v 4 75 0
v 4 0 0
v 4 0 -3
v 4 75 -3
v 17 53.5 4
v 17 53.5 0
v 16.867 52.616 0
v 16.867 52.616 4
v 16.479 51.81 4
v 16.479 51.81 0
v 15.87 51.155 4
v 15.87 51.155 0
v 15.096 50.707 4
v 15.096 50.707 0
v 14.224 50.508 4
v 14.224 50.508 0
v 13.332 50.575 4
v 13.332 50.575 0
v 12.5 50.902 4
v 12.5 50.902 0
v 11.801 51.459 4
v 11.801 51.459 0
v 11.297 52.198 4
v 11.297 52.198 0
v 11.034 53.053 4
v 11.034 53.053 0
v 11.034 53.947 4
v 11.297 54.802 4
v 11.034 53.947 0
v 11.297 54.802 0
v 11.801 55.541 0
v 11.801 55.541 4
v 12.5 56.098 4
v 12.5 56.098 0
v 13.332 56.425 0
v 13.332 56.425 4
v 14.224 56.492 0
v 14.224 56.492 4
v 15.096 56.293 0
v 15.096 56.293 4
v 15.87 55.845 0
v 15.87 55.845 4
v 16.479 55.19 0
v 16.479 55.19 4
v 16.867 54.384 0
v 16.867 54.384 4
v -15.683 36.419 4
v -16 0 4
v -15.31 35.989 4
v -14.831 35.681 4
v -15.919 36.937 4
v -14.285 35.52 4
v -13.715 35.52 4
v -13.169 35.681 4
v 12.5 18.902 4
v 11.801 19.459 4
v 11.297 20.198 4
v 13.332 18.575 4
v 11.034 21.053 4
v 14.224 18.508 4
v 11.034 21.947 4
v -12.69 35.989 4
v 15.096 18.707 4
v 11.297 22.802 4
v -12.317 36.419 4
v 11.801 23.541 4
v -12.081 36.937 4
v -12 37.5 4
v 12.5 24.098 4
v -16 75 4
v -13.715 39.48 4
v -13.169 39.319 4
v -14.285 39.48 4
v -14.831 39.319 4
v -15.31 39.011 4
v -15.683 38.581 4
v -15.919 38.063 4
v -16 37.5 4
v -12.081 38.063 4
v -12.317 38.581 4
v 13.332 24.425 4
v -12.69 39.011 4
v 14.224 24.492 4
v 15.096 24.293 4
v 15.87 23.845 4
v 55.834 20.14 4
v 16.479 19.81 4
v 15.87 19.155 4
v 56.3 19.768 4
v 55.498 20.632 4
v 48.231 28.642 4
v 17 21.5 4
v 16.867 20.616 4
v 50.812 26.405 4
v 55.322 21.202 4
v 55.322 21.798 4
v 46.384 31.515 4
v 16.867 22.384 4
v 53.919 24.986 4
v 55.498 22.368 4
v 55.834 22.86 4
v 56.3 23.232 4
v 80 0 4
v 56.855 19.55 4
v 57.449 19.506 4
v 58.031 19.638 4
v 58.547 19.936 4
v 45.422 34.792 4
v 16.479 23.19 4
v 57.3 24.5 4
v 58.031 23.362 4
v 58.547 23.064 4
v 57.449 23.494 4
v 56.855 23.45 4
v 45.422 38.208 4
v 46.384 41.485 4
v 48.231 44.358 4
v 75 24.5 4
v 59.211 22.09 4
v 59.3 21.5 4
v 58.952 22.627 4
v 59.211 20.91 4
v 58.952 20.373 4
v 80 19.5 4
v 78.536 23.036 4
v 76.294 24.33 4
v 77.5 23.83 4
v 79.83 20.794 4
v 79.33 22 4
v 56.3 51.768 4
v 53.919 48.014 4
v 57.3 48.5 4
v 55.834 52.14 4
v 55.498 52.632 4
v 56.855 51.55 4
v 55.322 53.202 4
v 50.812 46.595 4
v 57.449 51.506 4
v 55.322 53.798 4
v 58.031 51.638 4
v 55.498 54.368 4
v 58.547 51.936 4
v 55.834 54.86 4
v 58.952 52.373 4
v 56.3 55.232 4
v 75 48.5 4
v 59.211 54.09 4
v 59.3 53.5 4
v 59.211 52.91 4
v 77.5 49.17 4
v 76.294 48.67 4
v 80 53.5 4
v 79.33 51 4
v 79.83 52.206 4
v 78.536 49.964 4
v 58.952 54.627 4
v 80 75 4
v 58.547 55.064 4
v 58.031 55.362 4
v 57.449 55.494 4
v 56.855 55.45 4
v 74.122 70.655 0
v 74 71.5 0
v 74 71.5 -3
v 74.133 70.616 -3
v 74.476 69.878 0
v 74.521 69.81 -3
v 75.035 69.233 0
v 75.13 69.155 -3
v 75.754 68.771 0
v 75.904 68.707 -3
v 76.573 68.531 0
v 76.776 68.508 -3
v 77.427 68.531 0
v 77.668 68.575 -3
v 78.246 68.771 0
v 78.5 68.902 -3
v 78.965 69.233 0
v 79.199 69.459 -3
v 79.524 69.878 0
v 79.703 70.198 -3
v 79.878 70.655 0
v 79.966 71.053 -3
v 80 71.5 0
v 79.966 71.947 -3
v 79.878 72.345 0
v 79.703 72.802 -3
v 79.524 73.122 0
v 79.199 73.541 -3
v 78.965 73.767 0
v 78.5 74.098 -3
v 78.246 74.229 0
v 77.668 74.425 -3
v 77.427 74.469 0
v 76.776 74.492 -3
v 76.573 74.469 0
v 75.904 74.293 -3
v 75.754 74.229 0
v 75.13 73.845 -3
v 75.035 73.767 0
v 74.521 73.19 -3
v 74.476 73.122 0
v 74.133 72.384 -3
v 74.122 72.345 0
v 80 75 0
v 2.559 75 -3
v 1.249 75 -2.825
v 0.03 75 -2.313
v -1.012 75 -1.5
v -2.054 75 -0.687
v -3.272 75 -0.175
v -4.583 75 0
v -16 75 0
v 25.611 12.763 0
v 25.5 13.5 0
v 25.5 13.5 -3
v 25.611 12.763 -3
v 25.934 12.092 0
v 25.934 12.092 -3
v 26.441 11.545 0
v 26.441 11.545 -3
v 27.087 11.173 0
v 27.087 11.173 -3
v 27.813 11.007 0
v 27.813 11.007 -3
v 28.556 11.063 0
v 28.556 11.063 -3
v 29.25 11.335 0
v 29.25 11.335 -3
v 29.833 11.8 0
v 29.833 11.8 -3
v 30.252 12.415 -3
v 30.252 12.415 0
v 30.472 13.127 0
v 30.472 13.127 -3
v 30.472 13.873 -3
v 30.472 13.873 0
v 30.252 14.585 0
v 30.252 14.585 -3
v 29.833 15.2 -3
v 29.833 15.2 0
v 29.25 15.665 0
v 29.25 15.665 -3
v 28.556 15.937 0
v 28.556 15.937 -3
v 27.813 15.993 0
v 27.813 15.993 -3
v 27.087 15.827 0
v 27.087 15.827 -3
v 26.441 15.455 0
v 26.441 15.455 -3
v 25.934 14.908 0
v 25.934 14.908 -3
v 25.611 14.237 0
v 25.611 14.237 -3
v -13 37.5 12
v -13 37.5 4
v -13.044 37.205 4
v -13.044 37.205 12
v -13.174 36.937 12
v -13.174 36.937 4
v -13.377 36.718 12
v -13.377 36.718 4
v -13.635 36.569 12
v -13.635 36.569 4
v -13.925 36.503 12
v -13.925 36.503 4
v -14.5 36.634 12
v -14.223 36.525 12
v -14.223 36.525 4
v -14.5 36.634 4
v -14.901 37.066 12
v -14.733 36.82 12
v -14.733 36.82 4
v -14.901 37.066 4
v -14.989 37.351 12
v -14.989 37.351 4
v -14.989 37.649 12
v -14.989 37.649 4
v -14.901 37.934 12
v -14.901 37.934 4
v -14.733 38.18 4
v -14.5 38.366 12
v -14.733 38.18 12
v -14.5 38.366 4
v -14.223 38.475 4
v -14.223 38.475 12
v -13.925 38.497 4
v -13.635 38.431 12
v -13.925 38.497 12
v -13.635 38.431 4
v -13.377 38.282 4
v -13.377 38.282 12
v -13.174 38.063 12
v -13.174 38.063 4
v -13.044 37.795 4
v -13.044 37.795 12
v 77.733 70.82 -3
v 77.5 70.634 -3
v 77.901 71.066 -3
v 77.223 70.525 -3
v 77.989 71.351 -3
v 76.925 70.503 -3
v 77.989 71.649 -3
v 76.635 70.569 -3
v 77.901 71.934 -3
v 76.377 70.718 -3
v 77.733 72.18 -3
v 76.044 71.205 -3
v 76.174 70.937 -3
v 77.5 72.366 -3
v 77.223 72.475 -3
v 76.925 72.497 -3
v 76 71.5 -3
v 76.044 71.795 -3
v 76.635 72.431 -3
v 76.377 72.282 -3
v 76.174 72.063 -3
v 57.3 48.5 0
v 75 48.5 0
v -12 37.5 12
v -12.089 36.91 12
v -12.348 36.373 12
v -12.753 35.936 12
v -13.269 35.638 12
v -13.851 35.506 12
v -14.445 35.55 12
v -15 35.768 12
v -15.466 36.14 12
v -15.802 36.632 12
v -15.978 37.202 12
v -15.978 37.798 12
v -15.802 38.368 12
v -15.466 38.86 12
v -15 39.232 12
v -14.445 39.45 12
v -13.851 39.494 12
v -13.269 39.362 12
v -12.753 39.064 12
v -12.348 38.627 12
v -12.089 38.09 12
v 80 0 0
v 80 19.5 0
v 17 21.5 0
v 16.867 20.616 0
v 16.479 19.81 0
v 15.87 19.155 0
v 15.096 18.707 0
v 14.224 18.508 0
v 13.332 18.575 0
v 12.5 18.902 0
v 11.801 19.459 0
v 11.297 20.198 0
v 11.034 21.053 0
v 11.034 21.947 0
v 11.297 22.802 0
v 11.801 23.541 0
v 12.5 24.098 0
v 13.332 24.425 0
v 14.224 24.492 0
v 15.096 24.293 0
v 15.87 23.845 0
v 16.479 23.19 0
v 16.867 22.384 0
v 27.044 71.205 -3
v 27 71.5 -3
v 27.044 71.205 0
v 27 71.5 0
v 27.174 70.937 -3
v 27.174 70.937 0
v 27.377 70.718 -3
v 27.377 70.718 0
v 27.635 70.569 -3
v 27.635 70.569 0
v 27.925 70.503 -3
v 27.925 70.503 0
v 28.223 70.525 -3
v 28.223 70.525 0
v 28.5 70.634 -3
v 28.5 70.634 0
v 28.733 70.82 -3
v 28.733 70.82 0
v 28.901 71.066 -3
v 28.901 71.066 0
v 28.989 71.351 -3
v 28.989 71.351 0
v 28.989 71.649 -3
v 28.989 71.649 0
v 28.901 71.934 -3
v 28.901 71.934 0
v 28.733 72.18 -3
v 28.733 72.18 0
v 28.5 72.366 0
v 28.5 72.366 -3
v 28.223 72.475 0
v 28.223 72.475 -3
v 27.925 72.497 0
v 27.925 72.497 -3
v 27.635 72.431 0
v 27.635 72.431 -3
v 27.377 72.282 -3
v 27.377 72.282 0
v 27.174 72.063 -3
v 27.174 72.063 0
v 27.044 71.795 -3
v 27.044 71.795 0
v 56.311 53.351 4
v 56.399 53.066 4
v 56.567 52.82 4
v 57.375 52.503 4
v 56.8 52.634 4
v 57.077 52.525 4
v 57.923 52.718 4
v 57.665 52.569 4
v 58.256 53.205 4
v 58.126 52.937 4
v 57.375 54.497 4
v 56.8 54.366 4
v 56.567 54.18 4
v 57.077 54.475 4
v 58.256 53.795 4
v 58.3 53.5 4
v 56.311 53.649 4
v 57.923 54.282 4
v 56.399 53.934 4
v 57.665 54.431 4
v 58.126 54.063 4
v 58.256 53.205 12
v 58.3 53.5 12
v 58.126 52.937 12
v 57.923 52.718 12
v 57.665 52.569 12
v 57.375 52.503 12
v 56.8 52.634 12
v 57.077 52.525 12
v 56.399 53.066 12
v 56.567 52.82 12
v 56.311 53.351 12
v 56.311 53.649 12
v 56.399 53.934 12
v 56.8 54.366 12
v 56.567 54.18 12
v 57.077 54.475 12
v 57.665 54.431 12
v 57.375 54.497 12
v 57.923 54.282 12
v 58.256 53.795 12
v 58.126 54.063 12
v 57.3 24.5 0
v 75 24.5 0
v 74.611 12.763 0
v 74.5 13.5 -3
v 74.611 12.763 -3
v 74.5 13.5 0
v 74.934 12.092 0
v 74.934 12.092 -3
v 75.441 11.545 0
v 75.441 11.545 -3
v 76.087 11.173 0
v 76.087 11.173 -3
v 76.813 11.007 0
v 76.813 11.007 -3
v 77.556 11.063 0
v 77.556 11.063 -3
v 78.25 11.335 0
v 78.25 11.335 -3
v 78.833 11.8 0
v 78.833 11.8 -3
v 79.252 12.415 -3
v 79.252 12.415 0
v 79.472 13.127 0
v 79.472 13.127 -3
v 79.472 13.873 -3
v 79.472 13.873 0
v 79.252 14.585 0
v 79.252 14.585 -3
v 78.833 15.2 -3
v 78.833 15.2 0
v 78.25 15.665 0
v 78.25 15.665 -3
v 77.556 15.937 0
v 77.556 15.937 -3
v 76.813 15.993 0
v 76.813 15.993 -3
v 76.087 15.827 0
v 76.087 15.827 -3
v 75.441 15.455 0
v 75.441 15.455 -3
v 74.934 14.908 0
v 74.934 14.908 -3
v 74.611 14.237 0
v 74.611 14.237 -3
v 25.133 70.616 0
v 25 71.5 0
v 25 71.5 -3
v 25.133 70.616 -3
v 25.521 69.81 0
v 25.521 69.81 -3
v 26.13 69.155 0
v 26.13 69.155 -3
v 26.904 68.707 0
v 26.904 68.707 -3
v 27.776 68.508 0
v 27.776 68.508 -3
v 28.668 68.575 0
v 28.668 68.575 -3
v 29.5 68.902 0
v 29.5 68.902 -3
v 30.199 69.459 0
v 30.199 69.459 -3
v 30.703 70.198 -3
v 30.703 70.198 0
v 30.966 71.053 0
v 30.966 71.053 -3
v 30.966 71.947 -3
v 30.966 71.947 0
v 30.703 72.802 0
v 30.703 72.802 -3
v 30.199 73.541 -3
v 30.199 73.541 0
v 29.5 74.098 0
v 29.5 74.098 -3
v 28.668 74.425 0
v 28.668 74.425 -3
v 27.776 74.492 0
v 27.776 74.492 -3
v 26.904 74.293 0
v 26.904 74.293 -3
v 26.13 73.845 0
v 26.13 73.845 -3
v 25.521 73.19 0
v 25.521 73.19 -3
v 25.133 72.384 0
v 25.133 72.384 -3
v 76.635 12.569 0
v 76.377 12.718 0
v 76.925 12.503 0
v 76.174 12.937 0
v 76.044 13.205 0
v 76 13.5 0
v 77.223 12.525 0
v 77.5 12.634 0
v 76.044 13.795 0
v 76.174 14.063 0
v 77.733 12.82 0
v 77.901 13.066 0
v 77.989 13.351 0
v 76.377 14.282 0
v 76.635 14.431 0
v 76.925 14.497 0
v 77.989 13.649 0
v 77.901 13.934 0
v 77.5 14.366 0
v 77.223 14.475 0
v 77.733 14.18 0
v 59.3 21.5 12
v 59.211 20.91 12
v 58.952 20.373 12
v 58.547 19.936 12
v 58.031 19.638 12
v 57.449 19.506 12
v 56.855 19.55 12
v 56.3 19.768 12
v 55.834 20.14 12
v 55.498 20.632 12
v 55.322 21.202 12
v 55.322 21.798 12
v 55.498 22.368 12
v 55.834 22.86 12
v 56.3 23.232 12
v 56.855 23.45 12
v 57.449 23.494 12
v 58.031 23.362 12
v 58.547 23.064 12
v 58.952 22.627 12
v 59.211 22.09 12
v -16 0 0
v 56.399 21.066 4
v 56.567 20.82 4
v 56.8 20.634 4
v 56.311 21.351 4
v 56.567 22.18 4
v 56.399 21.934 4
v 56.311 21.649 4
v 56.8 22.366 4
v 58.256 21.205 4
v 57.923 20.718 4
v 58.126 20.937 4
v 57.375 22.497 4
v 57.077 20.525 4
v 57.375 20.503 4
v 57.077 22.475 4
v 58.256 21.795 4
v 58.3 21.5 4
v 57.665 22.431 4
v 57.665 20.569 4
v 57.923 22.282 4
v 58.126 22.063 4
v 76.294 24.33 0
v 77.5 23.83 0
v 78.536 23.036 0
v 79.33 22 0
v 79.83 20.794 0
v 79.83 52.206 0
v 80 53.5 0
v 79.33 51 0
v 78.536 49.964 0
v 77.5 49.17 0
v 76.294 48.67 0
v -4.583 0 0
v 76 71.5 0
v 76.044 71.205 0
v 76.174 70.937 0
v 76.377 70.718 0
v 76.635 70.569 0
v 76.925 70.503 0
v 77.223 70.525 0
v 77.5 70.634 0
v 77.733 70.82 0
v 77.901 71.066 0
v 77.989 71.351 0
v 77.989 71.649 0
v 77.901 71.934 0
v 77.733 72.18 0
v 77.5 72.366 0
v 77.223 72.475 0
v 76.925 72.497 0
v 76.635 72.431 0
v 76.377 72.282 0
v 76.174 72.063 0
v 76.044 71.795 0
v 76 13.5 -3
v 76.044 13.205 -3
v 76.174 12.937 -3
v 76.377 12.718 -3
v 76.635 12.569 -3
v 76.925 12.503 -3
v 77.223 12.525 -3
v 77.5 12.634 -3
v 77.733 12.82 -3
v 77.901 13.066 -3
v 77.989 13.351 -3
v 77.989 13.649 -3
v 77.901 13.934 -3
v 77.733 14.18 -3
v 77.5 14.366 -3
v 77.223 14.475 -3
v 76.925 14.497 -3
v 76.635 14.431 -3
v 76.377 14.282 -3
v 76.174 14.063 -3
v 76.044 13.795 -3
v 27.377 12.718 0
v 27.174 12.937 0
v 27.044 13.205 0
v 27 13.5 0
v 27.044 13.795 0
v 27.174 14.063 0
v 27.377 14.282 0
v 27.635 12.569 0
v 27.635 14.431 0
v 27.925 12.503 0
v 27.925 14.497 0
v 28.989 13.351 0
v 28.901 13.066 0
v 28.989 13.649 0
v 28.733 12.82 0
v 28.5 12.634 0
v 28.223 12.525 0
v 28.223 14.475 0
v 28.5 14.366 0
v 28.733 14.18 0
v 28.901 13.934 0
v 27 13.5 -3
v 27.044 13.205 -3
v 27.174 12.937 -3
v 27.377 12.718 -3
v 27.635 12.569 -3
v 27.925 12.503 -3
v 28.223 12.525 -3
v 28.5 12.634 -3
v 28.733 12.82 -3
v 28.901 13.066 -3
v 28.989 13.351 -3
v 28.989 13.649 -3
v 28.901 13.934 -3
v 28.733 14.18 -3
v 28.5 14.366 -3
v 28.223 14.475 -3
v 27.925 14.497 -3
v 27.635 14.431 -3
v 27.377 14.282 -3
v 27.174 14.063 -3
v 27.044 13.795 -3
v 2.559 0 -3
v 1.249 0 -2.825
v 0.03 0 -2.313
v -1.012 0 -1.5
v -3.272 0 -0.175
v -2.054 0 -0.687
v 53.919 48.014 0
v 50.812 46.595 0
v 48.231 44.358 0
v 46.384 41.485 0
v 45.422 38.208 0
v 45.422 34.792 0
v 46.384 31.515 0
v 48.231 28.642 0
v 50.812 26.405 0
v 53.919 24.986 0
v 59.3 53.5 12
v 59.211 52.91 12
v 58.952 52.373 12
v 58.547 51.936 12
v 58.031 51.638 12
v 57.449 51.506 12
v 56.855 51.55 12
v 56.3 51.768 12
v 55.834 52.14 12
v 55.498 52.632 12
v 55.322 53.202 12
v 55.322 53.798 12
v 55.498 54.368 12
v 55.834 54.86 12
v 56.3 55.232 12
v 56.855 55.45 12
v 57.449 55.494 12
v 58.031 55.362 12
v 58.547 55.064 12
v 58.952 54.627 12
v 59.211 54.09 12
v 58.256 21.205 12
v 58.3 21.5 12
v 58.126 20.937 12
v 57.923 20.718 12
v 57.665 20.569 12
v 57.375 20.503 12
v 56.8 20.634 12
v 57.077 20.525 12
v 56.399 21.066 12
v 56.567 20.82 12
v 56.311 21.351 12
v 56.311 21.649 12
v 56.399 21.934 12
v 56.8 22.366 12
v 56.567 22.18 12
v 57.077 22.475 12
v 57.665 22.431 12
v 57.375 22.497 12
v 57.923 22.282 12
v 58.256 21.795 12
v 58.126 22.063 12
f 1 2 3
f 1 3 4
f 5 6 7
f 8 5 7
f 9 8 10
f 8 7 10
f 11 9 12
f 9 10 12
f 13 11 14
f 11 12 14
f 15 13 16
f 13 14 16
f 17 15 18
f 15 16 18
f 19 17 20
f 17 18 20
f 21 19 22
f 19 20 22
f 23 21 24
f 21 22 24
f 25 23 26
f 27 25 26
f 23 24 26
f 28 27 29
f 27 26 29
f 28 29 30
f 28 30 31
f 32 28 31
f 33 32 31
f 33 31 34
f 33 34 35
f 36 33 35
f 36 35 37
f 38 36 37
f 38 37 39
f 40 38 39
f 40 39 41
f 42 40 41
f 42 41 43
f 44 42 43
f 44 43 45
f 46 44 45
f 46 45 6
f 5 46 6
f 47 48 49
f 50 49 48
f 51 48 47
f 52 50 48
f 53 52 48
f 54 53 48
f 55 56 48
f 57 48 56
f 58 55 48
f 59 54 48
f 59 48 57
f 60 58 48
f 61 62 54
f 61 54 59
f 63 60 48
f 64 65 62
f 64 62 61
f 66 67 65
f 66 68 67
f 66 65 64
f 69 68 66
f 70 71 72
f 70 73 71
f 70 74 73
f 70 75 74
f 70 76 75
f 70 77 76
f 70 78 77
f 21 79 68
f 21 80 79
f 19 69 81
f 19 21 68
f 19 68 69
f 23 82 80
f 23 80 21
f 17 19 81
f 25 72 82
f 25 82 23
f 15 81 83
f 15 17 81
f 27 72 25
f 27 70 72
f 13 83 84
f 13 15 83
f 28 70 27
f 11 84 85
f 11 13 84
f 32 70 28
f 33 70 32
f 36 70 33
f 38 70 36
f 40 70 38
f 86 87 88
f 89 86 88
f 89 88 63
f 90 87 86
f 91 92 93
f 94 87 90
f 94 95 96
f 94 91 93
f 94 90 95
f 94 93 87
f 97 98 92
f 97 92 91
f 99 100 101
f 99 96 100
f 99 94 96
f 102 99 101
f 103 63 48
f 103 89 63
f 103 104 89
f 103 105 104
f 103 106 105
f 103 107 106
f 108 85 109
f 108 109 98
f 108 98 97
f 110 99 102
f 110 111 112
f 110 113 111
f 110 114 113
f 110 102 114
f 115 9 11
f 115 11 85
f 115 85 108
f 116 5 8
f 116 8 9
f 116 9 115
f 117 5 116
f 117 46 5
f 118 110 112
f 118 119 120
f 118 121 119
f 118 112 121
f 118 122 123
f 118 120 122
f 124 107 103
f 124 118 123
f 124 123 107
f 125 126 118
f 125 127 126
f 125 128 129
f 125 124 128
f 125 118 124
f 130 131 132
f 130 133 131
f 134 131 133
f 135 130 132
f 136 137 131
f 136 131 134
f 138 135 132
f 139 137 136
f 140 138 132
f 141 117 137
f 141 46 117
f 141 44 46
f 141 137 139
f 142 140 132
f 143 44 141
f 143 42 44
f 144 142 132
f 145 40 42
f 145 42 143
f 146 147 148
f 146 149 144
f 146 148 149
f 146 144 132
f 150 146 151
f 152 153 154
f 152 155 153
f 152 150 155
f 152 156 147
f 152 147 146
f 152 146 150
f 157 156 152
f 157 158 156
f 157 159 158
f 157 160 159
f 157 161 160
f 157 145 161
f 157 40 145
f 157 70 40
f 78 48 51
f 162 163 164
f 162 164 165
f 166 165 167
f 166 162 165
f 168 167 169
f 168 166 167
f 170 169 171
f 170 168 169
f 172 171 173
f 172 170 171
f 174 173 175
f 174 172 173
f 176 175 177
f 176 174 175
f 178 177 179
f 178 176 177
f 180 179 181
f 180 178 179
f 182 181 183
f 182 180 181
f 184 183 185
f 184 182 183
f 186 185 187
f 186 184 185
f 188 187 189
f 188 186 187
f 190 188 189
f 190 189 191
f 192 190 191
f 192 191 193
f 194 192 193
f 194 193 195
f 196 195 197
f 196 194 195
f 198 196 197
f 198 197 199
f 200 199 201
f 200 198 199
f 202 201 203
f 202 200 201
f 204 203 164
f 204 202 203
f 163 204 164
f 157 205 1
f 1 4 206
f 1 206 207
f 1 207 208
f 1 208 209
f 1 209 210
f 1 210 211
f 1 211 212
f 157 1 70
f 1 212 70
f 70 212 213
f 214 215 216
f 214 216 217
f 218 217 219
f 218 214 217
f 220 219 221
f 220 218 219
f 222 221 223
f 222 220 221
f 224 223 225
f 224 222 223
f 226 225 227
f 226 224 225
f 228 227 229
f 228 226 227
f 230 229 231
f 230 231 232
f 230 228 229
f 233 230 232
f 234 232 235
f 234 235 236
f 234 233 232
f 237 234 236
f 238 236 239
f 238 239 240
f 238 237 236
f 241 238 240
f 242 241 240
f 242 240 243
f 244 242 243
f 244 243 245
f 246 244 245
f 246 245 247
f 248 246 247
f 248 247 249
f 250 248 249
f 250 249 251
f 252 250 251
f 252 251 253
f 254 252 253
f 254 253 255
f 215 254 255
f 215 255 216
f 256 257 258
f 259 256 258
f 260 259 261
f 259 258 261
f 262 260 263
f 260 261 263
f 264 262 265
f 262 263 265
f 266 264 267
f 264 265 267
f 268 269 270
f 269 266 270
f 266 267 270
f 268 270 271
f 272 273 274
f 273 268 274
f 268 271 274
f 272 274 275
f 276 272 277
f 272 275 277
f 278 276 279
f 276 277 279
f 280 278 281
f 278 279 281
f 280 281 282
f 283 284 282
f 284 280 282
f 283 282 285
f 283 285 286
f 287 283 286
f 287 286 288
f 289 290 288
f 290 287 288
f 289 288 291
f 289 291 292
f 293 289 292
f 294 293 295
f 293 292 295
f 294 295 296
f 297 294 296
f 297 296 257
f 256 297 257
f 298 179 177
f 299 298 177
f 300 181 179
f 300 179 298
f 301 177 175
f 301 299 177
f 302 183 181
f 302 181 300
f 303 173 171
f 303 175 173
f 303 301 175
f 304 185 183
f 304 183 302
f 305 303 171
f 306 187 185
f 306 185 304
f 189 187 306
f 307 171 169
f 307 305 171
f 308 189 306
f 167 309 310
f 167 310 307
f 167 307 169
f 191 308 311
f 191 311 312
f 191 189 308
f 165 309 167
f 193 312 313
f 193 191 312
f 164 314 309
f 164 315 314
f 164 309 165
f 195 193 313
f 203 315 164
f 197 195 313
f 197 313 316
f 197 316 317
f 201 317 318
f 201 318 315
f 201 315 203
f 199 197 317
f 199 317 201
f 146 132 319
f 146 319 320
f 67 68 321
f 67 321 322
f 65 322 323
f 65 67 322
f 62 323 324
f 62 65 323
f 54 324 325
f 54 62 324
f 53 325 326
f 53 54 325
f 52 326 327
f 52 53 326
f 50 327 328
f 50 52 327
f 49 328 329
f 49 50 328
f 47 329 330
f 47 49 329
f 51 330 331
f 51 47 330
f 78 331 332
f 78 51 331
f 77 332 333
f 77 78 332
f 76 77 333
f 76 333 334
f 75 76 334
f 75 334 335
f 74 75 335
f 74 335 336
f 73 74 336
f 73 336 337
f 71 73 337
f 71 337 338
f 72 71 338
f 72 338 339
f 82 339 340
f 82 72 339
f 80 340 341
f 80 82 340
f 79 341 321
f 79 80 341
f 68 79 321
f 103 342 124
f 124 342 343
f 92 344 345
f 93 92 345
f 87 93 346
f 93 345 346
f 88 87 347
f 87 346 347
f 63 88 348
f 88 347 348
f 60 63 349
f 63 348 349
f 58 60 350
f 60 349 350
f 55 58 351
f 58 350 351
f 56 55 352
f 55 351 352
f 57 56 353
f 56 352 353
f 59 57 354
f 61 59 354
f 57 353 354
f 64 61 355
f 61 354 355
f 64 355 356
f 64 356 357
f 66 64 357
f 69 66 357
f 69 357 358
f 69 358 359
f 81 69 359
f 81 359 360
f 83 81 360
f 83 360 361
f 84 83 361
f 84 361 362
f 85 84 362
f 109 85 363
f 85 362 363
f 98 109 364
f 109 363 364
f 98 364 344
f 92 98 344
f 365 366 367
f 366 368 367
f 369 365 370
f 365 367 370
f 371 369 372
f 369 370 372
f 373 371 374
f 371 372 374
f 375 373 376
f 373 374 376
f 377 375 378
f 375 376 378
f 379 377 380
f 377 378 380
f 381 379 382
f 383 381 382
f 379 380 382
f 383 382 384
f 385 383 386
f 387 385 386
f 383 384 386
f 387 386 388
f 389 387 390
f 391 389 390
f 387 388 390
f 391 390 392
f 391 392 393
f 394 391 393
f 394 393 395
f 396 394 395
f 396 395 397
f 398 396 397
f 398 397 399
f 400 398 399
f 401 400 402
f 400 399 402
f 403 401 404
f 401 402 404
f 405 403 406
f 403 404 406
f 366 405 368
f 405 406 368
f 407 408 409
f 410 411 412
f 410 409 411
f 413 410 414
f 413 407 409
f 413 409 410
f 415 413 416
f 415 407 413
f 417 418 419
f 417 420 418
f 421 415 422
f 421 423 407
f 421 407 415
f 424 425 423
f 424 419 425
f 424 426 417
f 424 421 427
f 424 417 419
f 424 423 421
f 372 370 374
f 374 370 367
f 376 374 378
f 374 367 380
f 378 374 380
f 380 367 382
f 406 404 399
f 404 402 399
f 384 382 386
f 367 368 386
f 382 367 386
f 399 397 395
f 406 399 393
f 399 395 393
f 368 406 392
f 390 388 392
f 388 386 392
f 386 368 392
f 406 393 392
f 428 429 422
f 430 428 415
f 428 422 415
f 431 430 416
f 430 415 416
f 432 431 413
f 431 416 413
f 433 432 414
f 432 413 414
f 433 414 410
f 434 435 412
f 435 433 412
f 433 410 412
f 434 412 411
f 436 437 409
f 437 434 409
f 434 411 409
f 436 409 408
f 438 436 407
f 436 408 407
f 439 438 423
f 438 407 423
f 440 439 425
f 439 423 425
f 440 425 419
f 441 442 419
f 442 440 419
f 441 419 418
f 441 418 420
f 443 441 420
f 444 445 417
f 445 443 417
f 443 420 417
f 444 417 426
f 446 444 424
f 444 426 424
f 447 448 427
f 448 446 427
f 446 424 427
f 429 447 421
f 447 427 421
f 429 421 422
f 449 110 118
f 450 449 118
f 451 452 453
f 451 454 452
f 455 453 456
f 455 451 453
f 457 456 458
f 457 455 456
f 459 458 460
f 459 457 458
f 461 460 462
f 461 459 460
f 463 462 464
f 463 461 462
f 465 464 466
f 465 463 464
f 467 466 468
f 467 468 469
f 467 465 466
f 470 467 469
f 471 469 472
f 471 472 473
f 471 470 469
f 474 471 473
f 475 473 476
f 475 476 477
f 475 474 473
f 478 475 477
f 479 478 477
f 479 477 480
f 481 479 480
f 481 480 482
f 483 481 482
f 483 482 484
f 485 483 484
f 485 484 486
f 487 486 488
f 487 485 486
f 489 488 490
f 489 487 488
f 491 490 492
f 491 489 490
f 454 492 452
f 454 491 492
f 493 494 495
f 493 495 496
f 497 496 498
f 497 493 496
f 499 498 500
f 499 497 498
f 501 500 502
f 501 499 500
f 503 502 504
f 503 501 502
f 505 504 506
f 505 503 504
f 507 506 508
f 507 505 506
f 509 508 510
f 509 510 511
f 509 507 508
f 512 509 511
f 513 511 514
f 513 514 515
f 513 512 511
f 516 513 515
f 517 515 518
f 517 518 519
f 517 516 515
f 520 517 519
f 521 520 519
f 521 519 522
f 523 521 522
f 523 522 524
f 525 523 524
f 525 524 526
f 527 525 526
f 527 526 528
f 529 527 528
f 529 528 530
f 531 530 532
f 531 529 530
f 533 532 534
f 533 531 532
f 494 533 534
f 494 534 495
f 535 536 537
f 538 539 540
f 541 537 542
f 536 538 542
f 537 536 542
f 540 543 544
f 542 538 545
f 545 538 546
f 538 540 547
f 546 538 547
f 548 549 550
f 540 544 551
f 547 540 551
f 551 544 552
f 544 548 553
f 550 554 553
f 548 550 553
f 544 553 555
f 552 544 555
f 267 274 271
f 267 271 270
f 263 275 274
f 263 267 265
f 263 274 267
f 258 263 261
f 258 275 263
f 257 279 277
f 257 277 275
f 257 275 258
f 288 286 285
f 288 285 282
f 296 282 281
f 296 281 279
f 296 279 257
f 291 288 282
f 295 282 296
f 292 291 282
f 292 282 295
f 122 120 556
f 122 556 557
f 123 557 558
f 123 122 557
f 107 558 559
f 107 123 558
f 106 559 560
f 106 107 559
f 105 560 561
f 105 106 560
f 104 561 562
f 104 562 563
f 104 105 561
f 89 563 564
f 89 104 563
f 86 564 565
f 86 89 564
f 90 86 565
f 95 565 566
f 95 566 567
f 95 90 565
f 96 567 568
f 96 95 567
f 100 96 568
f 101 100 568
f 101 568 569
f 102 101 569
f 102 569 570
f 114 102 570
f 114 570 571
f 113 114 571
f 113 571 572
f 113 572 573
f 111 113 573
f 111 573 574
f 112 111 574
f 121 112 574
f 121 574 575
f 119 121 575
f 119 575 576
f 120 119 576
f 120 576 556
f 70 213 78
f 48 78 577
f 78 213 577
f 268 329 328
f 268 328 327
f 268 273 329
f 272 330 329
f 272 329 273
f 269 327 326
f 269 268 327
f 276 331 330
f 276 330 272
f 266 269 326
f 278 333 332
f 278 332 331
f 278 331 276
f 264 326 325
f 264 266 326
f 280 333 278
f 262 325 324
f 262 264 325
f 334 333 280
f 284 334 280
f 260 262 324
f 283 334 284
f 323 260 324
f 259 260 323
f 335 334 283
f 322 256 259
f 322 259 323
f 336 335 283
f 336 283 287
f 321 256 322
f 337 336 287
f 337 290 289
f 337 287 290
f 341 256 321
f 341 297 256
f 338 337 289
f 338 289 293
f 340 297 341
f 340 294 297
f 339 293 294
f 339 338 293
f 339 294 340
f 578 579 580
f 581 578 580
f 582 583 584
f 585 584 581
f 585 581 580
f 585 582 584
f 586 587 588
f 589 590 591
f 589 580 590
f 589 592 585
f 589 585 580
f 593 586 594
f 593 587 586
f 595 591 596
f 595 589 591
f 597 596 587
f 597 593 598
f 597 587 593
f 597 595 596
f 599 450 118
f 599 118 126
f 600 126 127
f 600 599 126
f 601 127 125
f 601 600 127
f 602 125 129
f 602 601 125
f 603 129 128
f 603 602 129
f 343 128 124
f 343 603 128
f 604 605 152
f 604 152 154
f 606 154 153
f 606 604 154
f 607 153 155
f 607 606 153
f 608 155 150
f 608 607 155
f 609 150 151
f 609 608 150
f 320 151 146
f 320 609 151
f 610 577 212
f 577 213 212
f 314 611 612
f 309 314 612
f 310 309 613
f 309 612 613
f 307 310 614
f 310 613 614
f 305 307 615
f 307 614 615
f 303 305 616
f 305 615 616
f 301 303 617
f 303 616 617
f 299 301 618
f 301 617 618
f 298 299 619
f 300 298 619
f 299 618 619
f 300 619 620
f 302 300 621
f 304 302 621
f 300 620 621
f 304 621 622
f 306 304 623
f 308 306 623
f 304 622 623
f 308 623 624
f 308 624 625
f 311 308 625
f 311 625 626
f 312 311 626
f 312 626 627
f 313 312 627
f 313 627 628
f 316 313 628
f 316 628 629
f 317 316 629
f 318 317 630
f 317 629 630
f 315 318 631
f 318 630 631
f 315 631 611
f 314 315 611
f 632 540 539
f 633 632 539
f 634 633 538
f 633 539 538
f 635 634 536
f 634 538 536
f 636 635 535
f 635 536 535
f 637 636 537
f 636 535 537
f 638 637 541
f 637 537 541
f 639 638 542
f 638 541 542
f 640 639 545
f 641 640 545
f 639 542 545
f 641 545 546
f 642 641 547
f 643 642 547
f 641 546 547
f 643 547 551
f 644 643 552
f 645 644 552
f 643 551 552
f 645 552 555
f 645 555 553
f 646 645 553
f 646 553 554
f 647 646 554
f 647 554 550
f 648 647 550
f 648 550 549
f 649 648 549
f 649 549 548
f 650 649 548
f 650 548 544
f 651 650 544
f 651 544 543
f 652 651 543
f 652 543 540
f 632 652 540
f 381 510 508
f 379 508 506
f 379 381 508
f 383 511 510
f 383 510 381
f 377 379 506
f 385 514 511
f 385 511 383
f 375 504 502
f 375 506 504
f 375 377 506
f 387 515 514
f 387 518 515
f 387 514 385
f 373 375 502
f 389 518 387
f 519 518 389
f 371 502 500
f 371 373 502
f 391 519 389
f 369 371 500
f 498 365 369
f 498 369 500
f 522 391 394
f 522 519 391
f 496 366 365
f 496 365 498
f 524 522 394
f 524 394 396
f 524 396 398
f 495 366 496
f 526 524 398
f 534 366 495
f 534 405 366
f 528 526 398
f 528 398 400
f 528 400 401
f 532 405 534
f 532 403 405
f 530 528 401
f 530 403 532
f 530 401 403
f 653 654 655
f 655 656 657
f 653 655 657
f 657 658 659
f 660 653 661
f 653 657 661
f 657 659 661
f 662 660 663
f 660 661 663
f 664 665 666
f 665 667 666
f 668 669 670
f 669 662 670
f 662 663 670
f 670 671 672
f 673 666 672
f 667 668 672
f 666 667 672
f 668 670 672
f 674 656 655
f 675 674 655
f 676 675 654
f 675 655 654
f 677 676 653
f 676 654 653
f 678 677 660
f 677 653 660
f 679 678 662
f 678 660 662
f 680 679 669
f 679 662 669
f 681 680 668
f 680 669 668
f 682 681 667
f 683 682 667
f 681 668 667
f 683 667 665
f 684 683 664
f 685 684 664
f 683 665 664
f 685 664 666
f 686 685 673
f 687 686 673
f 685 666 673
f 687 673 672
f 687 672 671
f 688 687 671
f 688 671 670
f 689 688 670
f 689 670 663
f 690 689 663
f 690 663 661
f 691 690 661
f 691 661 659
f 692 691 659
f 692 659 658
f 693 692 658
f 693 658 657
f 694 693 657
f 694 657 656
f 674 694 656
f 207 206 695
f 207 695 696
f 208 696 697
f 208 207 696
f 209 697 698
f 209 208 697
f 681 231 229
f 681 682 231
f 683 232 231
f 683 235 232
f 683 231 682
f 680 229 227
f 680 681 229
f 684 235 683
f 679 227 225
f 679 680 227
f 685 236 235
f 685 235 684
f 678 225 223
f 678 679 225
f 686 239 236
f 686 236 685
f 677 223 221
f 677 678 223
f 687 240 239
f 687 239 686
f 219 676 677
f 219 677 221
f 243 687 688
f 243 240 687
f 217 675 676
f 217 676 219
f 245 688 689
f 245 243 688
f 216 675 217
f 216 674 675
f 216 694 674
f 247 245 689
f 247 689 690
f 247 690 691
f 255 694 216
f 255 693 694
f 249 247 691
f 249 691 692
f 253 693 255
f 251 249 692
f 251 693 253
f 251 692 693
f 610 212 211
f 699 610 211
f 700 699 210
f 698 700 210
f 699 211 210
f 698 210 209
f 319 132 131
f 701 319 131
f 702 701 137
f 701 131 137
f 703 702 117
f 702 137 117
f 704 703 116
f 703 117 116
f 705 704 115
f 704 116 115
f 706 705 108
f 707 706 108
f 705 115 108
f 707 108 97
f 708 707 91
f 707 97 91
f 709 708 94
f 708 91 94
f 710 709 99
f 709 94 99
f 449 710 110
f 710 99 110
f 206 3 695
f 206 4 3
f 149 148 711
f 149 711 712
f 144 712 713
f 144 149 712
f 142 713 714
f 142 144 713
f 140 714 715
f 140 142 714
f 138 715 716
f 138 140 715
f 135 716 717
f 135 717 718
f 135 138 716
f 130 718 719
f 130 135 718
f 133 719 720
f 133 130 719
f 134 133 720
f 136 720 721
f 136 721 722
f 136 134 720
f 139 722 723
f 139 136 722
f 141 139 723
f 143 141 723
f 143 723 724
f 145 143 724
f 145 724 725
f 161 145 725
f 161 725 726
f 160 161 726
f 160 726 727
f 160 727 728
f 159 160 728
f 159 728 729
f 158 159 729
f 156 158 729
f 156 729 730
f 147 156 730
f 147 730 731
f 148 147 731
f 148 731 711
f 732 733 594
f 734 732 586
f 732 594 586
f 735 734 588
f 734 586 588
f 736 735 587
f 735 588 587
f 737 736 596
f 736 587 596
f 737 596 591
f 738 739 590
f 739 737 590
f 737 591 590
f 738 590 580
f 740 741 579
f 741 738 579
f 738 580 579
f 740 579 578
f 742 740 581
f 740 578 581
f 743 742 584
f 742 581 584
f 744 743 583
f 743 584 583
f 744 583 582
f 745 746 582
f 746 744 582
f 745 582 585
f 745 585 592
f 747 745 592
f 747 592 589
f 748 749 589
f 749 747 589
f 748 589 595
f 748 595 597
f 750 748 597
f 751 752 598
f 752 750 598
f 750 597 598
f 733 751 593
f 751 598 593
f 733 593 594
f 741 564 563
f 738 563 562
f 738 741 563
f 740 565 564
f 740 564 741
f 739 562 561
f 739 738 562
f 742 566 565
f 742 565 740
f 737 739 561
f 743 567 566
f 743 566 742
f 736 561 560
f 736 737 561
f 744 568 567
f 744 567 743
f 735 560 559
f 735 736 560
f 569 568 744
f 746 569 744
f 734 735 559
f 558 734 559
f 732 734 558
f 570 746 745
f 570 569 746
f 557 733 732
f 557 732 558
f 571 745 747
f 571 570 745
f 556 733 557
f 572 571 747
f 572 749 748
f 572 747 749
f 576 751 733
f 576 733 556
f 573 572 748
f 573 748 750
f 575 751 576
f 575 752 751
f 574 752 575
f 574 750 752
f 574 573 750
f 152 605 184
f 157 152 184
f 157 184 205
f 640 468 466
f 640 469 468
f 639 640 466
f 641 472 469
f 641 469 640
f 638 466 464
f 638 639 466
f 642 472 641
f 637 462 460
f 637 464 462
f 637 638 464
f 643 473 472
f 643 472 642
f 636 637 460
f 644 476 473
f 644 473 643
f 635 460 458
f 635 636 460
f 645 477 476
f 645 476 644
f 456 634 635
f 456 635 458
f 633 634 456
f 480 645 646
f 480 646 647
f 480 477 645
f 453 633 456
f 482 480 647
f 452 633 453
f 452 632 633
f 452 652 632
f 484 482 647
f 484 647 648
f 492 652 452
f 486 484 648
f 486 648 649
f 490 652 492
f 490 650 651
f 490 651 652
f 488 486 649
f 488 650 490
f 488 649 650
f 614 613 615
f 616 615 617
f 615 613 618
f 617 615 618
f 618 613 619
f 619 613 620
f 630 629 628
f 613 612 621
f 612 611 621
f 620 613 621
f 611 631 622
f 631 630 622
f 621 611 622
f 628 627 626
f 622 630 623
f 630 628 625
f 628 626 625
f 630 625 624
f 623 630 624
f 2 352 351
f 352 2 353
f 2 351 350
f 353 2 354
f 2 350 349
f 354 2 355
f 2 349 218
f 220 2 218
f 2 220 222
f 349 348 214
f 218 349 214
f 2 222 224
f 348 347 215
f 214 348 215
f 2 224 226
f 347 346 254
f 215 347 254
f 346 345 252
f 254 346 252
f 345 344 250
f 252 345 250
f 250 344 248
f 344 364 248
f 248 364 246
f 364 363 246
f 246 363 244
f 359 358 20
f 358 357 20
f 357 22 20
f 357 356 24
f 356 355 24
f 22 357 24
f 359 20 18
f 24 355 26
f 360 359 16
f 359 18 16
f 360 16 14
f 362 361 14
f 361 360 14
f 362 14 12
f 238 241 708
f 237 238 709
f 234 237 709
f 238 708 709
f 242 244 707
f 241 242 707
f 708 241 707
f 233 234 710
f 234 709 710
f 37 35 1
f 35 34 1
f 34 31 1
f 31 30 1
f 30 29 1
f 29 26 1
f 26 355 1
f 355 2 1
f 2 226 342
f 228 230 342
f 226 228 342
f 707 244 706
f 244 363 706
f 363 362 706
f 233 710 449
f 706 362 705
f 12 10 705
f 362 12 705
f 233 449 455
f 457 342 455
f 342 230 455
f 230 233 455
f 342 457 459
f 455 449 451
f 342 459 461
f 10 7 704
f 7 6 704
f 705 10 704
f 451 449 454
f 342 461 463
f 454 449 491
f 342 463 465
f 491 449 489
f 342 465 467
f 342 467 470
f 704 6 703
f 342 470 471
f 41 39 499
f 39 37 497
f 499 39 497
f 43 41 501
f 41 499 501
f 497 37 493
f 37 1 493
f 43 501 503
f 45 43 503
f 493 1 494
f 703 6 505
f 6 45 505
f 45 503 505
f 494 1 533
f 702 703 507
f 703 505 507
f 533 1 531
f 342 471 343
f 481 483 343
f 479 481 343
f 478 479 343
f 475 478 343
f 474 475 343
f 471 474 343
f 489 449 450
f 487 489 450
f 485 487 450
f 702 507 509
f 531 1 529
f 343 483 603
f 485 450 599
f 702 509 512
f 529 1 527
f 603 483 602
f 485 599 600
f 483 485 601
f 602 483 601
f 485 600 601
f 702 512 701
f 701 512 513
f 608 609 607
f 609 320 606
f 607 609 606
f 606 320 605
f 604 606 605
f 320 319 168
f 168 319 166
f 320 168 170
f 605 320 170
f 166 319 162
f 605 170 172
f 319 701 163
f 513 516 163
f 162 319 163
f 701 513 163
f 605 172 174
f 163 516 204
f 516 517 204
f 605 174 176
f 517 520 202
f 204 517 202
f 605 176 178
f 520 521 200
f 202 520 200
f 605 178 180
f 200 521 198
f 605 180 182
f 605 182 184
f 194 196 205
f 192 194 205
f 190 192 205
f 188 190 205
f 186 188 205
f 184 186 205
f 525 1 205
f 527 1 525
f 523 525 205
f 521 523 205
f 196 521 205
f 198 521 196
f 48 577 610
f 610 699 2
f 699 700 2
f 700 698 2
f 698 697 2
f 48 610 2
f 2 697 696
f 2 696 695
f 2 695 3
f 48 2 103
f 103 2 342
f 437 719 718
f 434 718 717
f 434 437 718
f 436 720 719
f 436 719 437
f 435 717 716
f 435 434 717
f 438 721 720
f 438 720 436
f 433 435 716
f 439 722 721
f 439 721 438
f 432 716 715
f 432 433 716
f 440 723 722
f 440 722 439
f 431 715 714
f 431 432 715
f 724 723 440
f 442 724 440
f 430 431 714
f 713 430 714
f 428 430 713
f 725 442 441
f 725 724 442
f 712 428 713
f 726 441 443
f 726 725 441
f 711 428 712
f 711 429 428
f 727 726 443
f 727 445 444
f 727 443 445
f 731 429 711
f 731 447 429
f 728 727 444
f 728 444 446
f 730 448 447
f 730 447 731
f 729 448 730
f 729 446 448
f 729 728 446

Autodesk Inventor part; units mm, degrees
ref_plane "YZ Plane" through (0, 0, 0) normal (1, 0, 0) x (0, 1, 0)
ref_plane "XZ Plane" through (0, 0, 0) normal (0, 1, 0) x (-1, 0, 0)
ref_plane "XY Plane" through (0, 0, 0) normal (0, 0, 1) x (1, 0, 0)
sketch "Szkic1" plane through (0, 0, 0) normal (0, 0, 1) x (1, 0, 0)
  line L0 (0, 0) -> (80, 0)
  line L1 (80, 0) -> (80, 75)
  line L2 (80, 75) -> (0, 75)
  line L3 (0, 75) -> (0, 0)
  circle A0 centre (14, 53.5) radius 3
  line L4 (14, 53.5) -> (14, 21.5)
  circle A1 centre (14, 21.5) radius 3
  line L5 (0, 75) -> (-16, 75)
  line L6 (-16, 75) -> (-16, 0)
  line L7 (-16, 0) -> (0, 0)
  line L8 (0, 0) -> (0, 75)
  dimension "d0" = 80
  dimension "d1" = 75
  dimension "d2" = 6
  dimension "d3" = 32
  dimension "d4" = 6
  dimension "d5" = 16
  dimension "d43" = 66
extrude "Wyciągnięcie proste1" add sketch "Szkic1" along normal blind 4
sketch "Szkic2" plane through (0, 0, 0) normal (0, 0, -1) x (-1, 0, 0)
  line L0 (16, 75) -> (16, 0) projected
  line L1 (-80, 75) -> (16, 75) projected
  line L2 (-80, 0) -> (-80, 75) projected
  line L3 (16, 0) -> (-80, 0) projected
  circle A0 centre (-14, 53.5) radius 3 projected
  circle A1 centre (-14, 21.5) radius 3 projected
  line L4 (-80, 75) -> (16, 75) projected
  line L5 (0, 0) -> (-4, 0)
  line L6 (-4, 0) -> (-4, 75)
  line L7 (-4, 75) -> (0, 75)
  line L8 (0, 75) -> (0, 0)
  line L9 (-4, 0) -> (-24, 0)
  line L10 (-24, 0) -> (-24, 75)
  line L11 (-24, 75) -> (-4, 75)
  line L12 (-4, 75) -> (-4, 0)
  line L13 (-24.5, 75) -> (-80.5, 75)
  line L14 (-80.5, 75) -> (-80.5, 13.5)
  line L15 (-80.5, 13.5) -> (-24.5, 13.5)
  line L16 (-24.5, 13.5) -> (-24.5, 75)
  line L17 (-28, 17) -> (-77, 17)
  line L18 (-77, 17) -> (-77, 71.5)
  line L19 (-77, 71.5) -> (-28, 71.5)
  line L20 (-28, 71.5) -> (-28, 17)
  circle A2 centre (-28, 71.5) radius 1
  circle A3 centre (-77, 71.5) radius 1
  circle A4 centre (-28, 71.5) radius 3
  circle A5 centre (-77, 71.5) radius 3
  circle A6 centre (-28, 13.5) radius 1
  circle A7 centre (-77, 13.5) radius 1
  circle A8 centre (-77, 13.5) radius 2.5
  circle A9 centre (-28, 13.5) radius 2.5
  dimension "d8" = 4
  dimension "d9" = 20
  dimension "d10" = 56
  dimension "d11" = 61.5
  dimension "d12" = 3.5
  dimension "d15" = 2
  dimension "d16" = 2
  dimension "d19" = 2
  dimension "d20" = 2
  dimension "d34" = 2
  dimension "d35" = 2
  dimension "d36" = 1.5
  dimension "d37" = 1.5
  dimension "d44" = 4
extrude "Wyciągnięcie proste2" add sketch "Szkic2" along normal blind 3 contours L8 L3 L6 L1 | A5 L19 A3 L18 | A9 L15 A6 | L15 A6 A9 | A8 L15 A7 | L15 A7 A8 | A5 L18 A3 L19 | A4 L20 A2 L19 | L19 A2 L20 A4
sketch "Szkic3" plane through (0, 0, 4) normal (0, 0, 1) x (1, 0, 0)
  circle A0 centre (-14, 37.5) radius 2
  circle A1 centre (-14, 37.5) radius 1
  line L0 (-14, 37.5) -> (57.3, 37.5)
  line L1 (57.3, 37.5) -> (57.3, 53.5)
  line L2 (57.3, 37.5) -> (57.3, 21.5)
  circle A2 centre (57.3, 21.5) radius 1
  circle A3 centre (57.3, 21.5) radius 2
  circle A4 centre (57.3, 53.5) radius 1
  circle A5 centre (57.3, 53.5) radius 2
  point P0 (0, 0)
  dimension "d23" = 4
  dimension "d24" = 2
  dimension "d25" = 71.3
  dimension "d26" = 16
  dimension "d27" = 16
  dimension "d28" = 2
  dimension "d29" = 4
  dimension "d30" = 2
  dimension "d31" = 4
extrude "Wyciągnięcie proste3" add sketch "Szkic3" along normal blind 8
sketch "Szkic4" plane through (0, 0, 4) normal (0, 0, 1) x (1, 0, 0)
  circle A0 centre (28, 71.5) radius 3 projected
  circle A1 centre (77, 13.5) radius 2.5 projected
  circle A2 centre (28, 13.5) radius 2.5 projected
  line L0 (4, 0) -> (4, 75) projected
  line L1 (80, 75) -> (4, 75) projected
  line L2 (80, 71.5) -> (80, 75) projected
  circle A3 centre (77, 71.5) radius 3 projected
  line L3 (80, 0) -> (80, 71.5) projected
  line L4 (4, 0) -> (80, 0) projected
  circle A4 centre (14, 53.5) radius 3 projected
  circle A5 centre (14, 21.5) radius 3 projected
  circle A6 centre (57.3, 21.5) radius 2 projected
  circle A7 centre (57.3, 53.5) radius 2 projected
  line L5 (57.3, 23.5) -> (57.3, 51.5)
  line L6 (57.3, 51.5) -> (57.3, 36.5)
  line L7 (57.3, 36.5) -> (80, 36.5)
  arc A8 (57.3, 48.5) -> (57.3, 24.5) centre (57.3, 36.5) ccw
  line L8 (57.3, 24.5) -> (80, 24.5)
  line L9 (57.3, 48.5) -> (80, 48.5)
  point P0 (0, 0)
  dimension "d38" = 15
extrude "Wyciągnięcie proste4" cut sketch "Szkic4" against normal blind 4 contours L8 L5 L7 L3 | L7 L5 L9 L3 | A8 L5
fillet "Zaokrąglenie1" radius 5 2 edges at (80, 24.5, 2) (80, 48.5, 2)
fillet "Zaokrąglenie2" radius 5 2 edges at (0, 37.5, 0) (0, 37.5, -3)
properties part number "RP4_LidarHolder"
